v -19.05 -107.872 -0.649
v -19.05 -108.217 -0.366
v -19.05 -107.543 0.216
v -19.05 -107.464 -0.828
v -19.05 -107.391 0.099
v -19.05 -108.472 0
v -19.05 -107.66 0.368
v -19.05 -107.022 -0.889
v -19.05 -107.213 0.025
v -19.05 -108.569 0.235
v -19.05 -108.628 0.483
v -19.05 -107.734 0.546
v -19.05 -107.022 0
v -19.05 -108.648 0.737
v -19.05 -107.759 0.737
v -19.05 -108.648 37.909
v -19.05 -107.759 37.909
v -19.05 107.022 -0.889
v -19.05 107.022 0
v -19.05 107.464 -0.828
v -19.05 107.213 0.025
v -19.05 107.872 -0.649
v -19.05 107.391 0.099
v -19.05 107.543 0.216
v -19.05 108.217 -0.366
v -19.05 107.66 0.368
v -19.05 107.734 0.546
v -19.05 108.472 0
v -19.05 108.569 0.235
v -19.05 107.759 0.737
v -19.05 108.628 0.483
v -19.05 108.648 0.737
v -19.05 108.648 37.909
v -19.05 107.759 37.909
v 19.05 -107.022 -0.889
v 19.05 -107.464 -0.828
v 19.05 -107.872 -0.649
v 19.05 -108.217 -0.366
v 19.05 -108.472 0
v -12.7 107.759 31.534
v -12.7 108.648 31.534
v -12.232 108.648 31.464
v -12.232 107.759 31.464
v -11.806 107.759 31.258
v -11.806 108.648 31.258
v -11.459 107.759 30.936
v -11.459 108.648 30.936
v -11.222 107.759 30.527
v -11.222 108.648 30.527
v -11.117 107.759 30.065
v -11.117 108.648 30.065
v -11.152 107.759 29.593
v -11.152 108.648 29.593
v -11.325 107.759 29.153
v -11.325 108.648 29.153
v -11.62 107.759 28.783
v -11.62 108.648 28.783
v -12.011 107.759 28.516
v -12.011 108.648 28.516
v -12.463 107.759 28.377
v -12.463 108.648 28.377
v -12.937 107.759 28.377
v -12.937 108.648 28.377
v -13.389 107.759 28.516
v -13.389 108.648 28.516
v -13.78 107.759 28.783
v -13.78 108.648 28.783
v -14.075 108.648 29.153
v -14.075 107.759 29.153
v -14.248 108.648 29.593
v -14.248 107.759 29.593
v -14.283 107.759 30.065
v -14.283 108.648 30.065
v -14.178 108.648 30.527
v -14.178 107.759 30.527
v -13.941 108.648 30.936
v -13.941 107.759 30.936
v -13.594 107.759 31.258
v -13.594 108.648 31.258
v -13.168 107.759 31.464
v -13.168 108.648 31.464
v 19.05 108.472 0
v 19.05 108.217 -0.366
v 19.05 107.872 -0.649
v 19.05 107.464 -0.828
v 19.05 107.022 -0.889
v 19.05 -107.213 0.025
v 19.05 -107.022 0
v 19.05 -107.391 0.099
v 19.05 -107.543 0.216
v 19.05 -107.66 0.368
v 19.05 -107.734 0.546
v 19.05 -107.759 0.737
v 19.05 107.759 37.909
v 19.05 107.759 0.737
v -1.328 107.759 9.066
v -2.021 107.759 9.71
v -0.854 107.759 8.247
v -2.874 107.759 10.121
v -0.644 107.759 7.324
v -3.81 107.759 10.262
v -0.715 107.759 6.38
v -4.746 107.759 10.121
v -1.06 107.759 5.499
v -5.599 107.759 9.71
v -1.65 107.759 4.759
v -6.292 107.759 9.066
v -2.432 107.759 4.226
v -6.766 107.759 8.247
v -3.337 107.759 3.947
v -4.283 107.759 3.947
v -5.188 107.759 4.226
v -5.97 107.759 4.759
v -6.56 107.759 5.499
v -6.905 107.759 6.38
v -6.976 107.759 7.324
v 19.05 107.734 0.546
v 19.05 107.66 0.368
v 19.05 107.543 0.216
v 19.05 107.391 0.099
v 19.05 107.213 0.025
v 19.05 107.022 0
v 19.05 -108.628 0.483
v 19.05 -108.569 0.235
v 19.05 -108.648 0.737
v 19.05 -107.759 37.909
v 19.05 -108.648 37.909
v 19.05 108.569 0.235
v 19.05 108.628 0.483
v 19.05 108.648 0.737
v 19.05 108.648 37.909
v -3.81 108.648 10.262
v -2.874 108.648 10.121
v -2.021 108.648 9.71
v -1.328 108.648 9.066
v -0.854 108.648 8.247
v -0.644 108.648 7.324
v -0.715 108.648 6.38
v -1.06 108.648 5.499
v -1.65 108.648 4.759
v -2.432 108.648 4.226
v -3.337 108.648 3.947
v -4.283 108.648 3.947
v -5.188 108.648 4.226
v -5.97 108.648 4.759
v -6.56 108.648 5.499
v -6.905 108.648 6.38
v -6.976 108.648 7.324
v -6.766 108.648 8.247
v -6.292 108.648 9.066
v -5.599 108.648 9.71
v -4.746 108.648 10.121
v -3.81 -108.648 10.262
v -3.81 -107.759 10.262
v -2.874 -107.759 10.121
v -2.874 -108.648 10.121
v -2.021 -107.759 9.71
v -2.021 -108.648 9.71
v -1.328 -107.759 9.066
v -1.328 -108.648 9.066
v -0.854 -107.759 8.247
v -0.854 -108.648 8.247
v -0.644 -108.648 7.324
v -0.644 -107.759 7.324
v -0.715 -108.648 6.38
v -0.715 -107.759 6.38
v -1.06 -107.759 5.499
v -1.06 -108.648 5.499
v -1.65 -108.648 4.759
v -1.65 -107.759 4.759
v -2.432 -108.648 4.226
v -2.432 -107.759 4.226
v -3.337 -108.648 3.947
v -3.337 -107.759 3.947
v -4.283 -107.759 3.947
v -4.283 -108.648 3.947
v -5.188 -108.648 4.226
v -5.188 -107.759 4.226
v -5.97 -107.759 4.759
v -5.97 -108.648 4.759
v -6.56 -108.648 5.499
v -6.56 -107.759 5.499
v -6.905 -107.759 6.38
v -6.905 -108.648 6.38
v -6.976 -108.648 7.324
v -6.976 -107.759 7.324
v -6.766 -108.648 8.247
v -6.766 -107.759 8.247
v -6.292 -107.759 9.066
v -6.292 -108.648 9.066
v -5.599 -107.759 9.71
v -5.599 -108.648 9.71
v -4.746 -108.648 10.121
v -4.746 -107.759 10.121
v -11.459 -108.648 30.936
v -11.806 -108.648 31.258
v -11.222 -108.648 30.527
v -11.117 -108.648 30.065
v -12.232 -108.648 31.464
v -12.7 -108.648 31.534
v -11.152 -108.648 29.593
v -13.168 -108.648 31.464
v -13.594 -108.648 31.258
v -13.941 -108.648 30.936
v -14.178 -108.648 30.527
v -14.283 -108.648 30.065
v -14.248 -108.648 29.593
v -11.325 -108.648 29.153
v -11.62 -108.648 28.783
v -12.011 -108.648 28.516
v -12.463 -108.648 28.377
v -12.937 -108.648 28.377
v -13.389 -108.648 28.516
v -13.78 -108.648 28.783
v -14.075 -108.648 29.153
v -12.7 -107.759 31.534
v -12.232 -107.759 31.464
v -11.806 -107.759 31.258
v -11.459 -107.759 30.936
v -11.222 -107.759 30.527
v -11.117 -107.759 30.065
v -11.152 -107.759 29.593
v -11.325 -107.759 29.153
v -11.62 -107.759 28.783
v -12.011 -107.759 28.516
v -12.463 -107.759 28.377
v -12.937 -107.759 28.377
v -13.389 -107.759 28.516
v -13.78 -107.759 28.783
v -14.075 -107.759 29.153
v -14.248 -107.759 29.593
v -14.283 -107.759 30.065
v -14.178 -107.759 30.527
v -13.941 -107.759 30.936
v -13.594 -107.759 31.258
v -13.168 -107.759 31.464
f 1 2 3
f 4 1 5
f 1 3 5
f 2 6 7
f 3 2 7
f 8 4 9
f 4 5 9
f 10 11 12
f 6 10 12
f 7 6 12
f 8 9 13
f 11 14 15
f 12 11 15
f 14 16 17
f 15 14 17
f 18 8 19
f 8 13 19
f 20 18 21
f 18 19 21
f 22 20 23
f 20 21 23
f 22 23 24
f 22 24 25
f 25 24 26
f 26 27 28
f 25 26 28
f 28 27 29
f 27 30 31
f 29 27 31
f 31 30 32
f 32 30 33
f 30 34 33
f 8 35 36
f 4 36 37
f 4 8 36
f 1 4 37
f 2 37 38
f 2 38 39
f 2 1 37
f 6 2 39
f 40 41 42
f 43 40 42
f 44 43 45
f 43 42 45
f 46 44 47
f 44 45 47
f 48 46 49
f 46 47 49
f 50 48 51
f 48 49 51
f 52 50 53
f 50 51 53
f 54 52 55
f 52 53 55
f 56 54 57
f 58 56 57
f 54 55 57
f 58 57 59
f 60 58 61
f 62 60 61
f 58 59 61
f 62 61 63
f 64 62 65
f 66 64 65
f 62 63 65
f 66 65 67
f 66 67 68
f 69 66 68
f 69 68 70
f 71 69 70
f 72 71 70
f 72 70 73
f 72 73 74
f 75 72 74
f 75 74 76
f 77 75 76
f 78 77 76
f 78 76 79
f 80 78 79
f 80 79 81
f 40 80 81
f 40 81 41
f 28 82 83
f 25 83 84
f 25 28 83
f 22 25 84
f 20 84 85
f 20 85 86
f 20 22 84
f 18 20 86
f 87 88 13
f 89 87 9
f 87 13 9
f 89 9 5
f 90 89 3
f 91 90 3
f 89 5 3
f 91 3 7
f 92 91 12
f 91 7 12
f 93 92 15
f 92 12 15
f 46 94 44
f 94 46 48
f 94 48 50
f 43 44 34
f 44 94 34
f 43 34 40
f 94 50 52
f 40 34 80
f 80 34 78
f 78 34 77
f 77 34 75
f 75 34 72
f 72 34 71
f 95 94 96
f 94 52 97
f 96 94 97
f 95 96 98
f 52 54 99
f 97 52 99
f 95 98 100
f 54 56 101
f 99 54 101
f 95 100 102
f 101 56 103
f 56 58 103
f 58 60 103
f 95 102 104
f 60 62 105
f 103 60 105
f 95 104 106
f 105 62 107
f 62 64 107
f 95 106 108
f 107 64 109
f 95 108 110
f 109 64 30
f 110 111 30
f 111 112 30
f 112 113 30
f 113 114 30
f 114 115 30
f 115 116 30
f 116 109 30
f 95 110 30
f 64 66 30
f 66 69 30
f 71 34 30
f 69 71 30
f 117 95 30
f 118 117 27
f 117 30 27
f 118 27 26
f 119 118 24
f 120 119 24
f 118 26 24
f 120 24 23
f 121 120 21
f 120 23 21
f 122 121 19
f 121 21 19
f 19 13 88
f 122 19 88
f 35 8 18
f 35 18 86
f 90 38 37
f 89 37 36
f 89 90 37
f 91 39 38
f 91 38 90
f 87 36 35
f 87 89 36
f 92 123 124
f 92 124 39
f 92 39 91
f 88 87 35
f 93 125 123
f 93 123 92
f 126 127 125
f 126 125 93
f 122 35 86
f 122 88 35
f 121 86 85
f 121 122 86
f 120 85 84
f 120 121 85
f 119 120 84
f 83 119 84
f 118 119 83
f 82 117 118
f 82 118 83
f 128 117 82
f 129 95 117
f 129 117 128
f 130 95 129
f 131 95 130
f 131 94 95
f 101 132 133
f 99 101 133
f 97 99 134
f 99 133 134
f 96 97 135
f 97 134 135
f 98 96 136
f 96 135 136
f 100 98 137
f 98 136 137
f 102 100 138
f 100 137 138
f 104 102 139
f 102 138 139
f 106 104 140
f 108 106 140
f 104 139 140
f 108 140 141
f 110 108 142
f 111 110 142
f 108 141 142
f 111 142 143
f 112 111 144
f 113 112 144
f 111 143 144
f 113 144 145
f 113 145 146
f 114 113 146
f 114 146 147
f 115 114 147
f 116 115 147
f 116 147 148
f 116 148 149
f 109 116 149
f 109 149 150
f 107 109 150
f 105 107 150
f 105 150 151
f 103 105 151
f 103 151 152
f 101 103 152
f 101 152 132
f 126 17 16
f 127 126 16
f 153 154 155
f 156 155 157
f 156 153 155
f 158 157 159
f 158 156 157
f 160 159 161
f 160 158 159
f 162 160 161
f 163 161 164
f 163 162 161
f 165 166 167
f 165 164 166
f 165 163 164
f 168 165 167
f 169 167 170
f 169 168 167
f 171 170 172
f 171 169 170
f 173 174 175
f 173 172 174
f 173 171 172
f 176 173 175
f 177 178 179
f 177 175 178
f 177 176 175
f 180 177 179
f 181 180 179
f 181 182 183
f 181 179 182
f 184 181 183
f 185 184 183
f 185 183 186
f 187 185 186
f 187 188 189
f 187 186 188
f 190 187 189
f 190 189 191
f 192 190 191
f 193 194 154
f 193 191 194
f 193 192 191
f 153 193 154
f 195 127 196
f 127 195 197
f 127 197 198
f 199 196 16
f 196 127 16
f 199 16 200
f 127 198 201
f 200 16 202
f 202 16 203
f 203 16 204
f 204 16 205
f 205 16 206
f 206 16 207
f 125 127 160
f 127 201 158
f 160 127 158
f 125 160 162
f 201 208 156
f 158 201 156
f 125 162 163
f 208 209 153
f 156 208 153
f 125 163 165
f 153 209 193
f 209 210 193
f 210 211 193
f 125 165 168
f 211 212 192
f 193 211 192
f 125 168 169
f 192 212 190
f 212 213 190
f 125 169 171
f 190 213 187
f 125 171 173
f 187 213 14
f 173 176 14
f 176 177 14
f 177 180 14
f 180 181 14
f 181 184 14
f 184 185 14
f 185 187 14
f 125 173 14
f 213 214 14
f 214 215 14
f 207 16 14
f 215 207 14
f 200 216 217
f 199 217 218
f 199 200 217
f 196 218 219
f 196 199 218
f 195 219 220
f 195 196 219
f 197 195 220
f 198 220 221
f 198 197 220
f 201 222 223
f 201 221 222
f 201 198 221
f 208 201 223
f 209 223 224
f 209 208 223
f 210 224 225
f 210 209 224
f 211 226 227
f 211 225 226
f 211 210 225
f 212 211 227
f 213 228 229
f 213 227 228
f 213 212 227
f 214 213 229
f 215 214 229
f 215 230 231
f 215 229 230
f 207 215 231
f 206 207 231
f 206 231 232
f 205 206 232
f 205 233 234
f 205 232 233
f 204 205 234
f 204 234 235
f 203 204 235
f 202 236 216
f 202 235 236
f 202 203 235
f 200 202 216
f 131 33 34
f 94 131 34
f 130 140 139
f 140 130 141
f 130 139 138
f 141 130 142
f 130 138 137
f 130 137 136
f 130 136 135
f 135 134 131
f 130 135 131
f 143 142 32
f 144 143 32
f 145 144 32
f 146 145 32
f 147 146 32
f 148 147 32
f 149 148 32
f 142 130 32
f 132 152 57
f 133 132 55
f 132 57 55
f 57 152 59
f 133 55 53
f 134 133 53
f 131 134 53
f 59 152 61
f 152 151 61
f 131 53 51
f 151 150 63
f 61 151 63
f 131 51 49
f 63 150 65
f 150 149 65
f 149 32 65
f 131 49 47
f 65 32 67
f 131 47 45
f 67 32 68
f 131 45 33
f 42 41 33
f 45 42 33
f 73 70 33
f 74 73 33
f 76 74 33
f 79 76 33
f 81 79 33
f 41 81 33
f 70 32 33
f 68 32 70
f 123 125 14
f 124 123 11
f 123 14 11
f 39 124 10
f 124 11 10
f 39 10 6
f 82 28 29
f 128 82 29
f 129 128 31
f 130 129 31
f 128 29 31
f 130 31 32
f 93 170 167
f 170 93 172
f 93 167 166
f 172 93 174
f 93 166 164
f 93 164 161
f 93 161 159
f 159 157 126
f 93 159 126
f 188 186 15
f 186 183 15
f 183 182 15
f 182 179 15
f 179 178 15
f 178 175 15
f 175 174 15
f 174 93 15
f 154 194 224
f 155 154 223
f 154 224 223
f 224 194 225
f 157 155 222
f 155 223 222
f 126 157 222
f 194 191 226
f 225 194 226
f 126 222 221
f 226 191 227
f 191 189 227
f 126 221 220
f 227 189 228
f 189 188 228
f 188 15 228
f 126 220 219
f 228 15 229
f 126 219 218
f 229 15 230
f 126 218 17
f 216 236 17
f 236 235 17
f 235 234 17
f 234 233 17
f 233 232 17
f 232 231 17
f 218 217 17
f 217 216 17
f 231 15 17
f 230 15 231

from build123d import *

# Parameters (mm, degrees)
SKETCH1_W                        = 38.1
SKETCH1_H                        = 292.1
BASE_FLANGE1_DEPTH               = 0.889
SKETCHED_START                   = -19.05
SKETCHED_BEND5_DEPTH             = 38.1
SKETCHED_BEND5_2_DEPTH           = 38.1
SKETCHED_BEND8_DEPTH             = 38.1
SKETCHED_BEND8_2_DEPTH           = 38.1
F_1_4_0_25_DIAMETER_HOLE4_D      = 6.35
F_1_4_0_25_DIAMETER_HOLE4_DEPTH  = 0.889
F_1_8_0_125_DIAMETER_HOLE1_D     = 3.175
F_1_8_0_125_DIAMETER_HOLE1_DEPTH = 0.889


# Read off the part's stored shape, not the designer's step: Sketched Bend5, Sketched Bend8
# Sheet-metal steps are written as plain solids
with BuildPart() as part:
    # Sketch1 → Base-Flange1 (new body)
    with BuildSketch(Plane.XY):
        Rectangle(SKETCH1_W, SKETCH1_H)
    extrude(amount=-BASE_FLANGE1_DEPTH)

    # Sketched Bend5 outline → Sketched Bend5 (cut)
    with BuildSketch(Plane.YZ.offset(SKETCHED_START)):
        with BuildLine():
            Line((146.05, 0), (108.471502454, 0))
            ThreePointArc((108.471502454, 0), (107.872412816, -0.64903926), (107.022366229, -0.889))
            Line((107.022366229, -0.889), (146.05, -0.889))
            Line((146.05, -0.889), (146.05, 0))
        make_face()
    extrude(amount=SKETCHED_BEND5_DEPTH, mode=Mode.SUBTRACT)

    # Sketched Bend5 2 outline → Sketched Bend5 2 (add)
    with BuildSketch(Plane.YZ.offset(SKETCHED_START)):
        with BuildLine():
            ThreePointArc((108.471502454, 0), (108.603234852, 0.357878789), (108.647966229, 0.7366))
            Line((108.647966229, 0.7366), (108.647966229, 37.908966229))
            Line((108.647966229, 37.908966229), (107.758966229, 37.908966229))
            Line((107.758966229, 37.908966229), (107.758966229, 0.7366))
            ThreePointArc((107.758966229, 0.7366), (107.543221084, 0.215745145), (107.022366229, 0))
            Line((107.022366229, 0), (108.471502454, 0))
        make_face()
    extrude(amount=SKETCHED_BEND5_2_DEPTH)

    # Sketched Bend8 outline → Sketched Bend8 (cut)
    with BuildSketch(Plane.YZ.offset(SKETCHED_START)):
        with BuildLine():
            ThreePointArc((-107.022366229, -0.889), (-107.872412816, -0.64903926), (-108.471502454, 0))
            Line((-108.471502454, 0), (-146.05, 0))
            Line((-146.05, 0), (-146.05, -0.889))
            Line((-146.05, -0.889), (-107.022366229, -0.889))
        make_face()
    extrude(amount=SKETCHED_BEND8_DEPTH, mode=Mode.SUBTRACT)

    # Sketched Bend8 2 outline → Sketched Bend8 2 (add)
    with BuildSketch(Plane.YZ.offset(SKETCHED_START)):
        with BuildLine():
            Line((-107.758966229, 0.7366), (-107.758966229, 37.908966229))
            Line((-107.758966229, 37.908966229), (-108.647966229, 37.908966229))
            Line((-108.647966229, 37.908966229), (-108.647966229, 0.7366))
            ThreePointArc((-108.647966229, 0.7366), (-108.603234852, 0.357878789), (-108.471502454, 0))
            Line((-108.471502454, 0), (-107.022366229, 0))
            ThreePointArc((-107.022366229, 0), (-107.543221084, 0.215745145), (-107.758966229, 0.7366))
        make_face()
    extrude(amount=SKETCHED_BEND8_2_DEPTH)

    # 1/4 (0.25) Diameter Hole4
    with Locations(Plane(origin=(-3.81, 107.758966229, 7.0866), x_dir=(0, 0, -1), z_dir=(0, -1, 0))):
        with Locations((0, 0)):
            f_1_4_0_25_diameter_hole4 = Hole(F_1_4_0_25_DIAMETER_HOLE4_D / 2, depth=F_1_4_0_25_DIAMETER_HOLE4_DEPTH)

    # 1/8 (0.125) Diameter Hole1
    with Locations(Plane(origin=(-12.7, 107.758966229, 29.9466), x_dir=(0, 0, -1), z_dir=(0, -1, 0))):
        with Locations((0, 0)):
            f_1_8_0_125_diameter_hole1 = Hole(F_1_8_0_125_DIAMETER_HOLE1_D / 2, depth=F_1_8_0_125_DIAMETER_HOLE1_DEPTH)

    # Mirror1: 1/4 (0.25) Diameter Hole4, 1/8 (0.125) Diameter Hole1 across plane
    add(f_1_4_0_25_diameter_hole4.mirror(Plane.ZX), mode=Mode.SUBTRACT)
    add(f_1_8_0_125_diameter_hole1.mirror(Plane.ZX), mode=Mode.SUBTRACT)


solid = part.part
